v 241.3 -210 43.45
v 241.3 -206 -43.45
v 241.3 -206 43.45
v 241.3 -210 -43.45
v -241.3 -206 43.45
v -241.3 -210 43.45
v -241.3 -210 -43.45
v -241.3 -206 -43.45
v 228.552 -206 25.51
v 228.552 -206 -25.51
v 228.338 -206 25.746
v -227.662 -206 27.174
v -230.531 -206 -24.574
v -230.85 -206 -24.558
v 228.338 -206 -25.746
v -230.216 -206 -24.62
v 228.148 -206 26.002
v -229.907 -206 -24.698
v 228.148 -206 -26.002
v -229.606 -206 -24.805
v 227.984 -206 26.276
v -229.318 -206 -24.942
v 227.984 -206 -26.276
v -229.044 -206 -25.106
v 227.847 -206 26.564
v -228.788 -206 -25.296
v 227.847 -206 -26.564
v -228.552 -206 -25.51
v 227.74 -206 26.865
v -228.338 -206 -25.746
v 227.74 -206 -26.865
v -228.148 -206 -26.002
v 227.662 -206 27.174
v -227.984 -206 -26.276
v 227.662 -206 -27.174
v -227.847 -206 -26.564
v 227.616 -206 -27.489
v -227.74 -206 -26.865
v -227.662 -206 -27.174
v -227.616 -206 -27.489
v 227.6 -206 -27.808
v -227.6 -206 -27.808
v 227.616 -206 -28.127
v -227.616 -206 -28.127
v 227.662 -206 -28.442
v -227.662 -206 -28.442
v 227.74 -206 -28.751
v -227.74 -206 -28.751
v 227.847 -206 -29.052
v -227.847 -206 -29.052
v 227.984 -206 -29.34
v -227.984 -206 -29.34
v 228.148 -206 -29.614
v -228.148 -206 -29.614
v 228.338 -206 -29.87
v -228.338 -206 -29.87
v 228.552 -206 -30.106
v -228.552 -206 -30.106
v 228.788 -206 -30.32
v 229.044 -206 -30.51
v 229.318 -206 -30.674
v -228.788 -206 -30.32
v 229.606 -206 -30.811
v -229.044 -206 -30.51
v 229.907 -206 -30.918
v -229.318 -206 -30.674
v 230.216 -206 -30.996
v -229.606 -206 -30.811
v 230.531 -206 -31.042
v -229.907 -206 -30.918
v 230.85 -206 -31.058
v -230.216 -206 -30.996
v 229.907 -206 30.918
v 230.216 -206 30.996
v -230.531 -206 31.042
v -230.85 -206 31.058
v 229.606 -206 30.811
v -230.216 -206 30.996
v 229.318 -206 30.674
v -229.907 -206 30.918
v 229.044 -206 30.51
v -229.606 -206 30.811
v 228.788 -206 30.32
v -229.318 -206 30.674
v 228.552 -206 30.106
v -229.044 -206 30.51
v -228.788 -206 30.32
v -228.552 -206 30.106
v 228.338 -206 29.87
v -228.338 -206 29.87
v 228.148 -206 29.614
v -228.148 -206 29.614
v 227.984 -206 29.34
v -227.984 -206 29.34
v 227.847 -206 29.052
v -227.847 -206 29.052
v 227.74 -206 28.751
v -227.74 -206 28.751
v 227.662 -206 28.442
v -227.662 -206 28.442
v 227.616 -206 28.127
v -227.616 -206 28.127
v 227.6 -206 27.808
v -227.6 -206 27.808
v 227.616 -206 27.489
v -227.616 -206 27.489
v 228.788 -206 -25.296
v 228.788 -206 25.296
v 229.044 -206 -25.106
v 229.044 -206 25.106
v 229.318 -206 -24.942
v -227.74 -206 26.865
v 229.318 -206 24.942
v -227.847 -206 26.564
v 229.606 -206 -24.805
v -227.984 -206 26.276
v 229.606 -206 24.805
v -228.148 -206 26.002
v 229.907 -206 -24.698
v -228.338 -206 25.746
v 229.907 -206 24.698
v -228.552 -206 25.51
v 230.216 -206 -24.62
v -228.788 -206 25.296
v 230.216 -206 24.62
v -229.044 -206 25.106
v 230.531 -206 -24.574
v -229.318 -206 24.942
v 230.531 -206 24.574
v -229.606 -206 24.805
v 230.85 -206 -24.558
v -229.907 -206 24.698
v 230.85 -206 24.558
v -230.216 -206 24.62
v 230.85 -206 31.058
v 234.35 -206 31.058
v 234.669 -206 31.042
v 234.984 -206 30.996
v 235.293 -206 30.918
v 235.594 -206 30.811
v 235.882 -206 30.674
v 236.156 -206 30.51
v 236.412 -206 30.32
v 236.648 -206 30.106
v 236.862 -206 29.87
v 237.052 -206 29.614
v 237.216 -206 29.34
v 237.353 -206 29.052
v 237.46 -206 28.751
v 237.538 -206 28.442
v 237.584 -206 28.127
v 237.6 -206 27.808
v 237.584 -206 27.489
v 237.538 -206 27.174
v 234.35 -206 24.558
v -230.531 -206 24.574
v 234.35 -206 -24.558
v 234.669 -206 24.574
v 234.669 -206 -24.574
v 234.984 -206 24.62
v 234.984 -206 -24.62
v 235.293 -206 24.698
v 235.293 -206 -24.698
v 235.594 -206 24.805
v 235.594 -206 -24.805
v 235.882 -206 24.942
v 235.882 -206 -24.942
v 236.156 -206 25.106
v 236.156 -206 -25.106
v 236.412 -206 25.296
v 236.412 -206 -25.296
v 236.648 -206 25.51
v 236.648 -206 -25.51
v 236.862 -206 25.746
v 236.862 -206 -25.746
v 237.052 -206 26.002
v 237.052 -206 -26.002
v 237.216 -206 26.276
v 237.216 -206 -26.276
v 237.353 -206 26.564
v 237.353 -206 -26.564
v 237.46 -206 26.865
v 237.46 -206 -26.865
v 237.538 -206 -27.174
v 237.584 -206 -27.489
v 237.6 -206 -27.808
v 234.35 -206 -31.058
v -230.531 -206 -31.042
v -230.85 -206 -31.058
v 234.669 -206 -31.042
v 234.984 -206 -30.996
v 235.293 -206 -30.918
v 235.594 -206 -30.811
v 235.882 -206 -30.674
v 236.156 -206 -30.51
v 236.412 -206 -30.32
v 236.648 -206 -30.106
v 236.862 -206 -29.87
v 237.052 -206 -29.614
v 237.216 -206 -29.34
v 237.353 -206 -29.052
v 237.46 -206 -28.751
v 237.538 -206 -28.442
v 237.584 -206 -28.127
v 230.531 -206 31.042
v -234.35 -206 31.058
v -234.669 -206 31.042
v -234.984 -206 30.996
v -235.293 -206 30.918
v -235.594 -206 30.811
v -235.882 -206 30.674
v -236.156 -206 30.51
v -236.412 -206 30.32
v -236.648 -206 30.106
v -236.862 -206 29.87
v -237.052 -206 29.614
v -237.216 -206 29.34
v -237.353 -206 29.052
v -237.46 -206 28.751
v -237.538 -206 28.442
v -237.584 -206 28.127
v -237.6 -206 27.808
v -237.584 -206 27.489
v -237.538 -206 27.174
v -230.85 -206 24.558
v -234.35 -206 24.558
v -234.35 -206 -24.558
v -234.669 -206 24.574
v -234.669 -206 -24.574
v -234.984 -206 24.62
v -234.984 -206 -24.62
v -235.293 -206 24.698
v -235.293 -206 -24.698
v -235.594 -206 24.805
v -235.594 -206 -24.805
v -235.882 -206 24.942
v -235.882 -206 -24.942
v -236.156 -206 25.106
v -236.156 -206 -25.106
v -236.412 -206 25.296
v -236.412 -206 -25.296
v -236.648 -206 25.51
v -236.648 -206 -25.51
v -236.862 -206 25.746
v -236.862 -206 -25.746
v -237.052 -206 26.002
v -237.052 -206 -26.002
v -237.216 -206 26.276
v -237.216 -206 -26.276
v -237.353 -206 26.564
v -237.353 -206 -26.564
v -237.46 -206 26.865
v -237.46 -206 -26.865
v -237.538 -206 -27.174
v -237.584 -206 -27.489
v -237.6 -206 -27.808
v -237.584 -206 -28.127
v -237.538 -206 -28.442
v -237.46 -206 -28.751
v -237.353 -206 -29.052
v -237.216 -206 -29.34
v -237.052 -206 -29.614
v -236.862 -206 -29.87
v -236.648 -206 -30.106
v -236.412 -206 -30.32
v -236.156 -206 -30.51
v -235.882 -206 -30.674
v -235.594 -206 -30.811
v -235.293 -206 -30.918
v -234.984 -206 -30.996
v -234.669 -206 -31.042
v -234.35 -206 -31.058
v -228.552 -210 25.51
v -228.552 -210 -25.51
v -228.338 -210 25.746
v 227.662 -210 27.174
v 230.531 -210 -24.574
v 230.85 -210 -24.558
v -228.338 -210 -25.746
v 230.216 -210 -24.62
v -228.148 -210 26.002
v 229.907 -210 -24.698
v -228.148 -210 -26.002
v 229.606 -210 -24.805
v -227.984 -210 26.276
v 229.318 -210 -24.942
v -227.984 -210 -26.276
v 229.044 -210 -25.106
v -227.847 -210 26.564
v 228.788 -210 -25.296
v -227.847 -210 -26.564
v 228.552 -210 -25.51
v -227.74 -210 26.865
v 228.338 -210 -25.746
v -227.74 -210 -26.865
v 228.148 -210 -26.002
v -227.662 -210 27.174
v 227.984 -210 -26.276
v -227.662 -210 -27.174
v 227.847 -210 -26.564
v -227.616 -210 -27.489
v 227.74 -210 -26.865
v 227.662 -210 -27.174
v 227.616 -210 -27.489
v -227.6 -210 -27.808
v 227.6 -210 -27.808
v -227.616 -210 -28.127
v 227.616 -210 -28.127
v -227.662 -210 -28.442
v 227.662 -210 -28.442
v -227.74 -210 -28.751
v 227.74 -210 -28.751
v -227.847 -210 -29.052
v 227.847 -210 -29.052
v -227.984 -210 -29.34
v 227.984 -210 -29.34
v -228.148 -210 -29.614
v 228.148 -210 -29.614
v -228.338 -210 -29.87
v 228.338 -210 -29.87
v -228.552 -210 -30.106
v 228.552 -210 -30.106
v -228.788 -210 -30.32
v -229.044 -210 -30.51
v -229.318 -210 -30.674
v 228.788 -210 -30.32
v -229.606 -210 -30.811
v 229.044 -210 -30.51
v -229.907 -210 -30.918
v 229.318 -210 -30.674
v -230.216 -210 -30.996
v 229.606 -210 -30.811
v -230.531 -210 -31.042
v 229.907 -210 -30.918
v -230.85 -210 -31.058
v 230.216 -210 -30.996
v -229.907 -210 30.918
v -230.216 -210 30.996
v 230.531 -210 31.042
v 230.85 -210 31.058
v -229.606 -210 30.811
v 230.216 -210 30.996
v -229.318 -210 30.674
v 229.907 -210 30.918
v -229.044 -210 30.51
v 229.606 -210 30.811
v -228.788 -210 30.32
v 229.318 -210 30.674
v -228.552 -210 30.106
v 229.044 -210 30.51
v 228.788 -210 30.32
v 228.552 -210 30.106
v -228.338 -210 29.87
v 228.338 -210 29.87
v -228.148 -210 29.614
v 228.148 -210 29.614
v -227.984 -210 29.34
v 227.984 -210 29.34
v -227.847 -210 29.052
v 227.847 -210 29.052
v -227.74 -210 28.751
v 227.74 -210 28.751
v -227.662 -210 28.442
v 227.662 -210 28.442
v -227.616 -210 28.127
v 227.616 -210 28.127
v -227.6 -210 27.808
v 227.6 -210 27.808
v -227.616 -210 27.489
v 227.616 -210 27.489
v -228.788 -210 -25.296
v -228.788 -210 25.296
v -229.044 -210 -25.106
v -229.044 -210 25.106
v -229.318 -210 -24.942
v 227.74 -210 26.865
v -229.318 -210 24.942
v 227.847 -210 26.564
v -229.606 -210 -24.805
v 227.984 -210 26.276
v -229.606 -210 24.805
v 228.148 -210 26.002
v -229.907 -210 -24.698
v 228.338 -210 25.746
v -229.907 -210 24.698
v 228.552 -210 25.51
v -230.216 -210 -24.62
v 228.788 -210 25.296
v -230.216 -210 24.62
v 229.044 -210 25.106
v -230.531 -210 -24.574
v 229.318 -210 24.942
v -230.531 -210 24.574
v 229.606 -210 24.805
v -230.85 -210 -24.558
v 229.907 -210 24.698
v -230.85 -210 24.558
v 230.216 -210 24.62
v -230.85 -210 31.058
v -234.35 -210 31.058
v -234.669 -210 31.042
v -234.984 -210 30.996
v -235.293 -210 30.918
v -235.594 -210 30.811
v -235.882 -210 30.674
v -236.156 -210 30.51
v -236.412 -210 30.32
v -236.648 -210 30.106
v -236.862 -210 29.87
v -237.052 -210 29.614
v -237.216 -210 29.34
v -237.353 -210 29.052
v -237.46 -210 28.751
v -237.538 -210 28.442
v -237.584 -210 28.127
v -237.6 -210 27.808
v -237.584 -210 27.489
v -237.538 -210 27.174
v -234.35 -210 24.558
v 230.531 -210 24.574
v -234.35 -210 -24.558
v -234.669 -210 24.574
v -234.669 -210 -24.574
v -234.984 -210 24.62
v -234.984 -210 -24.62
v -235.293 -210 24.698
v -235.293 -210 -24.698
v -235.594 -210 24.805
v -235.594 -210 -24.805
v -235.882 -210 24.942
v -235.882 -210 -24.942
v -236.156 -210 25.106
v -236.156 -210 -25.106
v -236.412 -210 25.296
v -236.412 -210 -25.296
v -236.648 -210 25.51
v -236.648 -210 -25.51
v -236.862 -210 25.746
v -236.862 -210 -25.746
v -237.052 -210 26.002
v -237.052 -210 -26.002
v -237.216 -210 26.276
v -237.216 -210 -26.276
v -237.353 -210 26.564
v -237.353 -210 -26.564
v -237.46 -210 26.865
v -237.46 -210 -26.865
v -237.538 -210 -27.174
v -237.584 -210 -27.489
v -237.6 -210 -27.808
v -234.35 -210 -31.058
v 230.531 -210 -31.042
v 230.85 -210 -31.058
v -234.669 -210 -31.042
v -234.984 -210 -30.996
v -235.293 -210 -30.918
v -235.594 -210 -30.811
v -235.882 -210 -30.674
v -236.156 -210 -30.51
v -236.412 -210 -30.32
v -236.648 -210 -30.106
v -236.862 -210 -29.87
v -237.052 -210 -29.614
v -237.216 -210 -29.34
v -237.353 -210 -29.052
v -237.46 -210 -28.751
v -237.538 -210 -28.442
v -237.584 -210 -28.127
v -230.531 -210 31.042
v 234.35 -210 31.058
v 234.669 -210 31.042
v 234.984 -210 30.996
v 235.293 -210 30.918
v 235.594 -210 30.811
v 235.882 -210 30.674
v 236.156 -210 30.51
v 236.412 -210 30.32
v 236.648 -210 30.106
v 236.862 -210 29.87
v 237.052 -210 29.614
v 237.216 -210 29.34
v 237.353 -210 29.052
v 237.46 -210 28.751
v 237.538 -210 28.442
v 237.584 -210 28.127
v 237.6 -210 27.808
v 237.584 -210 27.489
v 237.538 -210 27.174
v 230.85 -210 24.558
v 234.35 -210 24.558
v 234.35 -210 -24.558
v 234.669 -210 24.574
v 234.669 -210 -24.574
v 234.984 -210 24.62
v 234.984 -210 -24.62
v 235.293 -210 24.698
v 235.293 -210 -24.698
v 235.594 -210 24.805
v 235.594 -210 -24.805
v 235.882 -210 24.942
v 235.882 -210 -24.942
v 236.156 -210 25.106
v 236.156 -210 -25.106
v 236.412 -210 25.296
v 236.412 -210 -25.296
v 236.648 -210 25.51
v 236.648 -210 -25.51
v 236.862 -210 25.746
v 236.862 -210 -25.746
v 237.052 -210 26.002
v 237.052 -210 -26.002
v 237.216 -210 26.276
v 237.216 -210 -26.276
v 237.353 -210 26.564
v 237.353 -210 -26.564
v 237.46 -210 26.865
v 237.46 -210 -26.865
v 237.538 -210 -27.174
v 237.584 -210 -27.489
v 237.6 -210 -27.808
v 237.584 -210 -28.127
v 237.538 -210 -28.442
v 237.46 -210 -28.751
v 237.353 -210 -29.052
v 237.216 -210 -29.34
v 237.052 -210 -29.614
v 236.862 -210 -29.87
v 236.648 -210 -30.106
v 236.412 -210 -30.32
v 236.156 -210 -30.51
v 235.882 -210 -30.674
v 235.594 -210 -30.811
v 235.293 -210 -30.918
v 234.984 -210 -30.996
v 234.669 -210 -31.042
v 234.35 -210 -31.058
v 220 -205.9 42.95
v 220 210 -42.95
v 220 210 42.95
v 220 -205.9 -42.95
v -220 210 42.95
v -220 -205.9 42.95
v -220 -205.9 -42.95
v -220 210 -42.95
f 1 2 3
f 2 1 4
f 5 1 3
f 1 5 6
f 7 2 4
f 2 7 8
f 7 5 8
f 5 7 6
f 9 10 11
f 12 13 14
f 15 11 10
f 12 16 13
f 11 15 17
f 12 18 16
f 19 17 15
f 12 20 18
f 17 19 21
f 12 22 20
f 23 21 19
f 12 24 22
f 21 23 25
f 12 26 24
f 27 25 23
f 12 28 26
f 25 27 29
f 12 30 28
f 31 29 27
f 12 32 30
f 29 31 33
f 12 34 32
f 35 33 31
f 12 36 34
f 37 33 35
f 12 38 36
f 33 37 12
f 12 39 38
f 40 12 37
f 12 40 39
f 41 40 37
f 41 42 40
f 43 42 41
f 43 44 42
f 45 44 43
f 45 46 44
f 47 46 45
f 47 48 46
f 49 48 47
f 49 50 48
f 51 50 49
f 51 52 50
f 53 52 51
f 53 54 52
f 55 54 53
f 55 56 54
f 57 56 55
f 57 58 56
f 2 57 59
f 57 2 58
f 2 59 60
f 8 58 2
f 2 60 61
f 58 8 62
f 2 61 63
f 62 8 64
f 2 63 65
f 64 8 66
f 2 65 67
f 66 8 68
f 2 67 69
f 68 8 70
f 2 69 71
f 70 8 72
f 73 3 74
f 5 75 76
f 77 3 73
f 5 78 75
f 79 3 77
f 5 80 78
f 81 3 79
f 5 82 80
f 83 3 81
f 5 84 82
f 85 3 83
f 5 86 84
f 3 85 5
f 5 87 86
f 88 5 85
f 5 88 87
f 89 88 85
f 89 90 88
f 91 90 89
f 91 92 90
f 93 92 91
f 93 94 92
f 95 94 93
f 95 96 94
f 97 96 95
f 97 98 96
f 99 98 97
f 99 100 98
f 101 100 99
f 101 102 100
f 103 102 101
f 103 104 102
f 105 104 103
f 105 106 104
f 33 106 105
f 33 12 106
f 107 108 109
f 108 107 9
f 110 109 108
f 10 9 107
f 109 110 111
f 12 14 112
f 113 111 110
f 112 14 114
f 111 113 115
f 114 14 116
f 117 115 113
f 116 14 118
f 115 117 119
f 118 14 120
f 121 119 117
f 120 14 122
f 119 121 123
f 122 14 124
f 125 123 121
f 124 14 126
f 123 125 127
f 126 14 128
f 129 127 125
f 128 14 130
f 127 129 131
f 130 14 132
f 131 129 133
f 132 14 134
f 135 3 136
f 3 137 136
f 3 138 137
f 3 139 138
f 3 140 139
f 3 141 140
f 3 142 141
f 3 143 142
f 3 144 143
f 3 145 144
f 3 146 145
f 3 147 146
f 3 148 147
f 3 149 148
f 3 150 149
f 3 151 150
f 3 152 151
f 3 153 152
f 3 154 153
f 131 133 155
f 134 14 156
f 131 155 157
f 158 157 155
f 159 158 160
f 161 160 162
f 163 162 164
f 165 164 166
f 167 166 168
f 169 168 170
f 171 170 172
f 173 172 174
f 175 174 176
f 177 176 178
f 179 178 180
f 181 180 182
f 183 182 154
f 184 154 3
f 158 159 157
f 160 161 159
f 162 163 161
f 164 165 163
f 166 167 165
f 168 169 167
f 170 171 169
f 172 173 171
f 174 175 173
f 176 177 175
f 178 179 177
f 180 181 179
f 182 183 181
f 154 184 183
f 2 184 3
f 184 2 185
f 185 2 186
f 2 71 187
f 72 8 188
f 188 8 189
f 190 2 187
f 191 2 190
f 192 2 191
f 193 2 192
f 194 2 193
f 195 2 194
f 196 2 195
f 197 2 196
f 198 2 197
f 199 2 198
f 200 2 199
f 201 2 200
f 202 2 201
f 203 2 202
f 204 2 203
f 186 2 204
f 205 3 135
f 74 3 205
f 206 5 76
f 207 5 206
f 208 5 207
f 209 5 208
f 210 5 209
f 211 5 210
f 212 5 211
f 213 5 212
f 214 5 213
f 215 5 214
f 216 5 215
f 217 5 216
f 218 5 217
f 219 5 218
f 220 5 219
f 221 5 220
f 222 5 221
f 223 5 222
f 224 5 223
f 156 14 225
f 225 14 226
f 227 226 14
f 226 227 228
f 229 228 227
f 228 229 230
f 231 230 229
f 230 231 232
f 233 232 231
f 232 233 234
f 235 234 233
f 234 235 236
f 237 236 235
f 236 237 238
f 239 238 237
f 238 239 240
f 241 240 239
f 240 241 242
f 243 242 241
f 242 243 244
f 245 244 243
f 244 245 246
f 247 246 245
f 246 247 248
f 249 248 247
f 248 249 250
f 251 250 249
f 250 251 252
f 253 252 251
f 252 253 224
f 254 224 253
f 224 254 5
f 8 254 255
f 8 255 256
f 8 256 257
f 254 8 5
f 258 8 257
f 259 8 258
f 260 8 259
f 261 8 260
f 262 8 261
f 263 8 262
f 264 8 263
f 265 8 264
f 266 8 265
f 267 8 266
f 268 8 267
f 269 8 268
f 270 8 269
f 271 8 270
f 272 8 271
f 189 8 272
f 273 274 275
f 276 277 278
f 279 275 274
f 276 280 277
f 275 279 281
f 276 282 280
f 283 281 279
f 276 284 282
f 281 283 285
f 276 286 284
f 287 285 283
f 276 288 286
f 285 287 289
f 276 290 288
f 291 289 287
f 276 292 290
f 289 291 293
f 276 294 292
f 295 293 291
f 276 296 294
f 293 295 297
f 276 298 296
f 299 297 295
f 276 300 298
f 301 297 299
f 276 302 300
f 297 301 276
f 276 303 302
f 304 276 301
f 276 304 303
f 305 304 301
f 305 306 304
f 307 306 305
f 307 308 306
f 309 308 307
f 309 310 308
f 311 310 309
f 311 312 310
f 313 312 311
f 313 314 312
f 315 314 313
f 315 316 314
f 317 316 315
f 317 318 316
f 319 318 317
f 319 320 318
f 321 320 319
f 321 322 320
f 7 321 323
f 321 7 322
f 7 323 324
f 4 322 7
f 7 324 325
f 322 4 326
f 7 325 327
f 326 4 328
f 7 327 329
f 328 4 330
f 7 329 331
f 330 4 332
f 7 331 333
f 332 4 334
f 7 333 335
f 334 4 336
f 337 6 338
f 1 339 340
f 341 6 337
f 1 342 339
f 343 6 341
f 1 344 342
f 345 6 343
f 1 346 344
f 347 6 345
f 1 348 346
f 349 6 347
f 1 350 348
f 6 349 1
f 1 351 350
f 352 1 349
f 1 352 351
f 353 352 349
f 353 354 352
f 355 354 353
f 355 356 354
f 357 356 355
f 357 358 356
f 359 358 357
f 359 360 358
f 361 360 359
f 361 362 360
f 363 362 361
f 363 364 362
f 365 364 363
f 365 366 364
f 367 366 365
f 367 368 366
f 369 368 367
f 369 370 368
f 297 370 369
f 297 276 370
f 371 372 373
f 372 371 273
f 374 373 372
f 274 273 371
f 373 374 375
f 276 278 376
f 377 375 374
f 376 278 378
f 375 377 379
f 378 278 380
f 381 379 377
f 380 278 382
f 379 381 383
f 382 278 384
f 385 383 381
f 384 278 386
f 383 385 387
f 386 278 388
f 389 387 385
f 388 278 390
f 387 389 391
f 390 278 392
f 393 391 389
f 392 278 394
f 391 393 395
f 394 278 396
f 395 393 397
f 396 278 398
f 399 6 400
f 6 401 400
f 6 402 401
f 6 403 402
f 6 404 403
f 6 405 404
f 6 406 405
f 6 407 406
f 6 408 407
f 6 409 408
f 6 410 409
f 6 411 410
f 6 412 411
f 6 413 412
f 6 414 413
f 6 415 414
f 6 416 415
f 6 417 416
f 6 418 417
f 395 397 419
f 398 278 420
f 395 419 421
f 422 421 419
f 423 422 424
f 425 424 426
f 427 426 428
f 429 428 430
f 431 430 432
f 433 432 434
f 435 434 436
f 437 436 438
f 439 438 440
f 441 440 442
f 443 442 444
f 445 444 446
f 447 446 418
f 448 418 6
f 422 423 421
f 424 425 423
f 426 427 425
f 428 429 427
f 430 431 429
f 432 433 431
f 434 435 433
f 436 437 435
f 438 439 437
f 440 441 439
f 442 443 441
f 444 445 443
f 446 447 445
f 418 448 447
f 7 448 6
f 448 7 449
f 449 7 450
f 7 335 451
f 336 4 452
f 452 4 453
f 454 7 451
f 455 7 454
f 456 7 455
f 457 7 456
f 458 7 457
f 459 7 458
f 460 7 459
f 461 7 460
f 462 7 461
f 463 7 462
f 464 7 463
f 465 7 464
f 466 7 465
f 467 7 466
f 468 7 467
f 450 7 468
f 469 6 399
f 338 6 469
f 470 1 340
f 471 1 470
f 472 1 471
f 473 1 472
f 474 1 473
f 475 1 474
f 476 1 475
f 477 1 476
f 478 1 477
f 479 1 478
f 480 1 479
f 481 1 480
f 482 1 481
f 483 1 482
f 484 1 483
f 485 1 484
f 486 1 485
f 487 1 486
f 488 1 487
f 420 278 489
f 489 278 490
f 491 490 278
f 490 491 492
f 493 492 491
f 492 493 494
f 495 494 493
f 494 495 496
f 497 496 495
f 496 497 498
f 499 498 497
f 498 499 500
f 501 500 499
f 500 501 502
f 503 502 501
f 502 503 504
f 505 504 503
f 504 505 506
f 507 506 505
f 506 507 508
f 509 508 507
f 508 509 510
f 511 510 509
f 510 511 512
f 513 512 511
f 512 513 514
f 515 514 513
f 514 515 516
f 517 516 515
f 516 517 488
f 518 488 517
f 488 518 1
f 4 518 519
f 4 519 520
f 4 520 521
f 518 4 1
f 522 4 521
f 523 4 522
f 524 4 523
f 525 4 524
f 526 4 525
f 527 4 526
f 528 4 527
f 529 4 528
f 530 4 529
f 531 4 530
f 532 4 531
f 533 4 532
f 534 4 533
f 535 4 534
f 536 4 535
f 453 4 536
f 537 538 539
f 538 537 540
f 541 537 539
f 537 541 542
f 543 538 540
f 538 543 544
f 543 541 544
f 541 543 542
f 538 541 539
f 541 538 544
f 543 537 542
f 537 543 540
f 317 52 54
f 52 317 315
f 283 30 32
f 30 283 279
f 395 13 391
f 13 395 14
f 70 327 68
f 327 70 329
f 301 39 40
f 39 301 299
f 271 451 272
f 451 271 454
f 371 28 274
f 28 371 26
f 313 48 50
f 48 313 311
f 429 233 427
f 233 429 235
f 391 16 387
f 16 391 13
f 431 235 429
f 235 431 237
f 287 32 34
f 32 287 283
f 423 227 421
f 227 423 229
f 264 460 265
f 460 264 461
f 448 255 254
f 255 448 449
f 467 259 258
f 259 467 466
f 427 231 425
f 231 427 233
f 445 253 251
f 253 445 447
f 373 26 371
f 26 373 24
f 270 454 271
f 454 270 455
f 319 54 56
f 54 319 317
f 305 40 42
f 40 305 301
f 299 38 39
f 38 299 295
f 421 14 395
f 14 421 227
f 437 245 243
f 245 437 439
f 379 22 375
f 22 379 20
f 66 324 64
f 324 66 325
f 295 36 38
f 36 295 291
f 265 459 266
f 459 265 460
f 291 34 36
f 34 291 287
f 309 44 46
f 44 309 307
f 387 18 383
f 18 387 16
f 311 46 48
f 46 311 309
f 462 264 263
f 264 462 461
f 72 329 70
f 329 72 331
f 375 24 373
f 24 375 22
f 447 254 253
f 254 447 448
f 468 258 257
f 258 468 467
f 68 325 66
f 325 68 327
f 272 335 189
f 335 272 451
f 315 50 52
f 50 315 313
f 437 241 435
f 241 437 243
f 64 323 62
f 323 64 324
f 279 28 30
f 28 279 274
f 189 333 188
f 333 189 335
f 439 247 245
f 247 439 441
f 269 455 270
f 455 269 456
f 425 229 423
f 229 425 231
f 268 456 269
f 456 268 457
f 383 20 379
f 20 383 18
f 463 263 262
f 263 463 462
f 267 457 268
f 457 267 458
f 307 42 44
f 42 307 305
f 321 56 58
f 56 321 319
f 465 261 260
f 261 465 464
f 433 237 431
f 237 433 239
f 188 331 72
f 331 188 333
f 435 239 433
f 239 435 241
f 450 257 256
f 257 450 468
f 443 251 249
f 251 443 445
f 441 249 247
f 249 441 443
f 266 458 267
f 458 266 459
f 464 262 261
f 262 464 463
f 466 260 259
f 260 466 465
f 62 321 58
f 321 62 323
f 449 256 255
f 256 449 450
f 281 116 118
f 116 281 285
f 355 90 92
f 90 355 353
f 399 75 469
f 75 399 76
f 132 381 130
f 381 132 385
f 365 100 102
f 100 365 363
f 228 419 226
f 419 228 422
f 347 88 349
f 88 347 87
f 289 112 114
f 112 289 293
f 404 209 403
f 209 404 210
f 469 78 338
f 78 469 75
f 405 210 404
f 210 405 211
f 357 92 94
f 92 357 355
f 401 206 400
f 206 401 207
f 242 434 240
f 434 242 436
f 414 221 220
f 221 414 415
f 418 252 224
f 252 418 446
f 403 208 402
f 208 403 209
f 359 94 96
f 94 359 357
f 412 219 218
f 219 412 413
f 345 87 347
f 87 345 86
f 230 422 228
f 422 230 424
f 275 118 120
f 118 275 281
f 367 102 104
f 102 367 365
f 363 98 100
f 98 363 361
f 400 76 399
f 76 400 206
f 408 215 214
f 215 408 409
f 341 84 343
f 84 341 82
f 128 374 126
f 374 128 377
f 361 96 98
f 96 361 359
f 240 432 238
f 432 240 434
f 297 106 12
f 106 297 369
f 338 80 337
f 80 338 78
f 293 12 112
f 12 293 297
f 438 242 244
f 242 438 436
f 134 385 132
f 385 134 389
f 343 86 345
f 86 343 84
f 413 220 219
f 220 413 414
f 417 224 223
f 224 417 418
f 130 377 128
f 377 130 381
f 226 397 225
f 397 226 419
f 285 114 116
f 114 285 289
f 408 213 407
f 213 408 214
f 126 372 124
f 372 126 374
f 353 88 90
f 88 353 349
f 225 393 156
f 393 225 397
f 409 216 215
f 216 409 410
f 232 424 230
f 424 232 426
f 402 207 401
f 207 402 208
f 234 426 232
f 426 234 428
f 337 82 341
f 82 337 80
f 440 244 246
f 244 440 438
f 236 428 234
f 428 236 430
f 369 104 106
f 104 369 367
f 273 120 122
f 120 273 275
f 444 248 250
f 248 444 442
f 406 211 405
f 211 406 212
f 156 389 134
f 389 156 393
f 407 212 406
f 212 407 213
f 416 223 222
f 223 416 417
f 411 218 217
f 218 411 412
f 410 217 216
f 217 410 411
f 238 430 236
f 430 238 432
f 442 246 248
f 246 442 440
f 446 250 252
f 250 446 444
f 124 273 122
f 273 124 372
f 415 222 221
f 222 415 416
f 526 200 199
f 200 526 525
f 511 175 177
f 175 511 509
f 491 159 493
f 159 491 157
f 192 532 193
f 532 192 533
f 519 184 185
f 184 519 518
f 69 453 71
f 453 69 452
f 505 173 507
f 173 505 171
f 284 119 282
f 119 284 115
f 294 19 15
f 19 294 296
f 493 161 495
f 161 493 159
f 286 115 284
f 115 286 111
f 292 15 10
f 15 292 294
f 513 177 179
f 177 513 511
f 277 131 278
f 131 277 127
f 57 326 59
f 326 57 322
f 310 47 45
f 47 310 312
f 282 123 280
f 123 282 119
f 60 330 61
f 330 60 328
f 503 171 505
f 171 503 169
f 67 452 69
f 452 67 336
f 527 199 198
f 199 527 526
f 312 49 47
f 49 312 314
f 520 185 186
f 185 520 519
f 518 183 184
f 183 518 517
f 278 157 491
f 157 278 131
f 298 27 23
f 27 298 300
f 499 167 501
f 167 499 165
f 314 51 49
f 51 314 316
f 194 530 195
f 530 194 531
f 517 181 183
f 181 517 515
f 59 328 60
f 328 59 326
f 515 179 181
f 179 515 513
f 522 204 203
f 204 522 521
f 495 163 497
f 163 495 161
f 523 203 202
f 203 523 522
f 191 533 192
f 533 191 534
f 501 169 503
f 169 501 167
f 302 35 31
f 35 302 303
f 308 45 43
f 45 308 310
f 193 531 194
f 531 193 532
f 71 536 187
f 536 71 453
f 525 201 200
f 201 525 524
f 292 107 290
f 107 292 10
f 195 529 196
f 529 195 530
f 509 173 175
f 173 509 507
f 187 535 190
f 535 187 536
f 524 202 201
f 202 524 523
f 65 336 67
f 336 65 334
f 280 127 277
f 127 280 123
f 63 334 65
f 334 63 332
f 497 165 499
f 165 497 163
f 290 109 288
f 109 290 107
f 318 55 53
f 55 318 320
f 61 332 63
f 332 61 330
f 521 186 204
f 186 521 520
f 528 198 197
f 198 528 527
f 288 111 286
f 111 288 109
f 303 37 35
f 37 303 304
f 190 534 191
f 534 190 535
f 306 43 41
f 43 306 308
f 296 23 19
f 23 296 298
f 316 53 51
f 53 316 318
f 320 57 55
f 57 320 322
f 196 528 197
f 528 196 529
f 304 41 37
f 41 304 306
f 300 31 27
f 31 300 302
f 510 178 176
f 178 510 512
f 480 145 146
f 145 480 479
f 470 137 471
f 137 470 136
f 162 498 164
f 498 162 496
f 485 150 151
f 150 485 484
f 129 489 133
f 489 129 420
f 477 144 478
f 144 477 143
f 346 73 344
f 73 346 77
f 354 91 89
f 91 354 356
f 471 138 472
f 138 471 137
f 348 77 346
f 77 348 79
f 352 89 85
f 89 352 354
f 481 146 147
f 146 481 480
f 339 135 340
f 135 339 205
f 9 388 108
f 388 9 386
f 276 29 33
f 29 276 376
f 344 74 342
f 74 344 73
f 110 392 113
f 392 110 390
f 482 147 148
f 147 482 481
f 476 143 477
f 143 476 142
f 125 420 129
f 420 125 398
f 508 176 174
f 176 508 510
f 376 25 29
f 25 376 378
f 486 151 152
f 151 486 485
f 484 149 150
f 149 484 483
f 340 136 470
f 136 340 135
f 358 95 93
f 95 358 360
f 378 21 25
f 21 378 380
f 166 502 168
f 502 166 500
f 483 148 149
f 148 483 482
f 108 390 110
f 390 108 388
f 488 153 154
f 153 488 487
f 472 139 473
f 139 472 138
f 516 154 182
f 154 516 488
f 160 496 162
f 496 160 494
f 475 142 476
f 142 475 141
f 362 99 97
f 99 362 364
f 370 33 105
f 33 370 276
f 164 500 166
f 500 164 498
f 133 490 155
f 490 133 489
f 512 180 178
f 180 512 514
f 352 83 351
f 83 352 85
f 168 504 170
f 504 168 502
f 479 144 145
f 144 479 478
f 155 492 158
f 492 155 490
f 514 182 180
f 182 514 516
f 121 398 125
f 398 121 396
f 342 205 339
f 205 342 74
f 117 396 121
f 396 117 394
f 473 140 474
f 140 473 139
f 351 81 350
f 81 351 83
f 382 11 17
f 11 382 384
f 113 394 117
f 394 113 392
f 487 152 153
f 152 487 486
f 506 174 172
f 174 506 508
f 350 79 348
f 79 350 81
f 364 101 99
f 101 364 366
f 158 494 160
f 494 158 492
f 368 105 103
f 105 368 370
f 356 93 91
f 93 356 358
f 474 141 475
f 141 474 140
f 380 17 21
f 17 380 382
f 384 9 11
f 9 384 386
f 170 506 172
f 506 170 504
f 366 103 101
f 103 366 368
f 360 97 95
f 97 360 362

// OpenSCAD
// ============================================================================
// Atom Lithography Machine — Parametric OpenSCAD Module (S6.2-03)
// ============================================================================
// part_id           : S6.2-03
// parent_bom_id     : S6.2
// subsystem         : S6
// part_name         : Cernox / RuO2 kriyojenik termometri seti ve PID isitici kontroloru
// material          : Al 6061
// temp_stage        : 20 mK - 300 K
// vacuum_grade      : Kriyo-vakum
// tolerance         : ±1 mK @ 20 mK
// computed_mass_kg  : 5.50516
// envelope_mm       : 482.600 x 432.050 x 86.900
// design_maturity   : M0_M1_DETAILED_CAD_DESIGN_ONLY
// no_lab_measurement: true
// iec61508_certified: false
// semi_s2_certified : false
// Units: millimeters (mm)
// ============================================================================

$fn = 64;

// Nominal bounding envelope parameters (mm)
bbox_x = 482.6000;
bbox_y = 432.0500;
bbox_z = 86.9000;

// Part-specific parametric dimensions
rack_u = 2;
bay = 2;
u_start = 4;
channels = 8;

// Interface / port parameters (mm)

module part_S6_2_03() {
  difference() {
    union() {
      // 19" EIA-310 front bezel panel
      translate([0.000, -208.000, 0.000]) cube([482.600, 4.000, 86.900], center=true);
      // Hollow EMI shielded chassis body
      translate([0.000, 2.050, 0.000]) cube([440.000, 415.900, 85.900], center=true);
    }
    // EIA-310 rack ear slot
    translate([-232.600, -208.000, -27.808]) rotate([90.000, 0.000, 0.000]) {
      hull() {
        translate([-1.750, 0, 0]) cylinder(d=6.500, h=6.000, center=true);
        translate([1.750, 0, 0]) cylinder(d=6.500, h=6.000, center=true);
      }
    }
    // EIA-310 rack ear slot
    translate([-232.600, -208.000, 27.808]) rotate([90.000, 0.000, 0.000]) {
      hull() {
        translate([-1.750, 0, 0]) cylinder(d=6.500, h=6.000, center=true);
        translate([1.750, 0, 0]) cylinder(d=6.500, h=6.000, center=true);
      }
    }
    // EIA-310 rack ear slot
    translate([232.600, -208.000, -27.808]) rotate([90.000, 0.000, 0.000]) {
      hull() {
        translate([-1.750, 0, 0]) cylinder(d=6.500, h=6.000, center=true);
        translate([1.750, 0, 0]) cylinder(d=6.500, h=6.000, center=true);
      }
    }
    // EIA-310 rack ear slot
    translate([232.600, -208.000, 27.808]) rotate([90.000, 0.000, 0.000]) {
      hull() {
        translate([-1.750, 0, 0]) cylinder(d=6.500, h=6.000, center=true);
        translate([1.750, 0, 0]) cylinder(d=6.500, h=6.000, center=true);
      }
    }
  }
}

// World assembly mounting transform (global machine frame, mm / deg):
// translate([2100.000, 0.000, 267.800]) rotate([0.000, 0.000, 0.000]) part_S6_2_03();

part_S6_2_03();
